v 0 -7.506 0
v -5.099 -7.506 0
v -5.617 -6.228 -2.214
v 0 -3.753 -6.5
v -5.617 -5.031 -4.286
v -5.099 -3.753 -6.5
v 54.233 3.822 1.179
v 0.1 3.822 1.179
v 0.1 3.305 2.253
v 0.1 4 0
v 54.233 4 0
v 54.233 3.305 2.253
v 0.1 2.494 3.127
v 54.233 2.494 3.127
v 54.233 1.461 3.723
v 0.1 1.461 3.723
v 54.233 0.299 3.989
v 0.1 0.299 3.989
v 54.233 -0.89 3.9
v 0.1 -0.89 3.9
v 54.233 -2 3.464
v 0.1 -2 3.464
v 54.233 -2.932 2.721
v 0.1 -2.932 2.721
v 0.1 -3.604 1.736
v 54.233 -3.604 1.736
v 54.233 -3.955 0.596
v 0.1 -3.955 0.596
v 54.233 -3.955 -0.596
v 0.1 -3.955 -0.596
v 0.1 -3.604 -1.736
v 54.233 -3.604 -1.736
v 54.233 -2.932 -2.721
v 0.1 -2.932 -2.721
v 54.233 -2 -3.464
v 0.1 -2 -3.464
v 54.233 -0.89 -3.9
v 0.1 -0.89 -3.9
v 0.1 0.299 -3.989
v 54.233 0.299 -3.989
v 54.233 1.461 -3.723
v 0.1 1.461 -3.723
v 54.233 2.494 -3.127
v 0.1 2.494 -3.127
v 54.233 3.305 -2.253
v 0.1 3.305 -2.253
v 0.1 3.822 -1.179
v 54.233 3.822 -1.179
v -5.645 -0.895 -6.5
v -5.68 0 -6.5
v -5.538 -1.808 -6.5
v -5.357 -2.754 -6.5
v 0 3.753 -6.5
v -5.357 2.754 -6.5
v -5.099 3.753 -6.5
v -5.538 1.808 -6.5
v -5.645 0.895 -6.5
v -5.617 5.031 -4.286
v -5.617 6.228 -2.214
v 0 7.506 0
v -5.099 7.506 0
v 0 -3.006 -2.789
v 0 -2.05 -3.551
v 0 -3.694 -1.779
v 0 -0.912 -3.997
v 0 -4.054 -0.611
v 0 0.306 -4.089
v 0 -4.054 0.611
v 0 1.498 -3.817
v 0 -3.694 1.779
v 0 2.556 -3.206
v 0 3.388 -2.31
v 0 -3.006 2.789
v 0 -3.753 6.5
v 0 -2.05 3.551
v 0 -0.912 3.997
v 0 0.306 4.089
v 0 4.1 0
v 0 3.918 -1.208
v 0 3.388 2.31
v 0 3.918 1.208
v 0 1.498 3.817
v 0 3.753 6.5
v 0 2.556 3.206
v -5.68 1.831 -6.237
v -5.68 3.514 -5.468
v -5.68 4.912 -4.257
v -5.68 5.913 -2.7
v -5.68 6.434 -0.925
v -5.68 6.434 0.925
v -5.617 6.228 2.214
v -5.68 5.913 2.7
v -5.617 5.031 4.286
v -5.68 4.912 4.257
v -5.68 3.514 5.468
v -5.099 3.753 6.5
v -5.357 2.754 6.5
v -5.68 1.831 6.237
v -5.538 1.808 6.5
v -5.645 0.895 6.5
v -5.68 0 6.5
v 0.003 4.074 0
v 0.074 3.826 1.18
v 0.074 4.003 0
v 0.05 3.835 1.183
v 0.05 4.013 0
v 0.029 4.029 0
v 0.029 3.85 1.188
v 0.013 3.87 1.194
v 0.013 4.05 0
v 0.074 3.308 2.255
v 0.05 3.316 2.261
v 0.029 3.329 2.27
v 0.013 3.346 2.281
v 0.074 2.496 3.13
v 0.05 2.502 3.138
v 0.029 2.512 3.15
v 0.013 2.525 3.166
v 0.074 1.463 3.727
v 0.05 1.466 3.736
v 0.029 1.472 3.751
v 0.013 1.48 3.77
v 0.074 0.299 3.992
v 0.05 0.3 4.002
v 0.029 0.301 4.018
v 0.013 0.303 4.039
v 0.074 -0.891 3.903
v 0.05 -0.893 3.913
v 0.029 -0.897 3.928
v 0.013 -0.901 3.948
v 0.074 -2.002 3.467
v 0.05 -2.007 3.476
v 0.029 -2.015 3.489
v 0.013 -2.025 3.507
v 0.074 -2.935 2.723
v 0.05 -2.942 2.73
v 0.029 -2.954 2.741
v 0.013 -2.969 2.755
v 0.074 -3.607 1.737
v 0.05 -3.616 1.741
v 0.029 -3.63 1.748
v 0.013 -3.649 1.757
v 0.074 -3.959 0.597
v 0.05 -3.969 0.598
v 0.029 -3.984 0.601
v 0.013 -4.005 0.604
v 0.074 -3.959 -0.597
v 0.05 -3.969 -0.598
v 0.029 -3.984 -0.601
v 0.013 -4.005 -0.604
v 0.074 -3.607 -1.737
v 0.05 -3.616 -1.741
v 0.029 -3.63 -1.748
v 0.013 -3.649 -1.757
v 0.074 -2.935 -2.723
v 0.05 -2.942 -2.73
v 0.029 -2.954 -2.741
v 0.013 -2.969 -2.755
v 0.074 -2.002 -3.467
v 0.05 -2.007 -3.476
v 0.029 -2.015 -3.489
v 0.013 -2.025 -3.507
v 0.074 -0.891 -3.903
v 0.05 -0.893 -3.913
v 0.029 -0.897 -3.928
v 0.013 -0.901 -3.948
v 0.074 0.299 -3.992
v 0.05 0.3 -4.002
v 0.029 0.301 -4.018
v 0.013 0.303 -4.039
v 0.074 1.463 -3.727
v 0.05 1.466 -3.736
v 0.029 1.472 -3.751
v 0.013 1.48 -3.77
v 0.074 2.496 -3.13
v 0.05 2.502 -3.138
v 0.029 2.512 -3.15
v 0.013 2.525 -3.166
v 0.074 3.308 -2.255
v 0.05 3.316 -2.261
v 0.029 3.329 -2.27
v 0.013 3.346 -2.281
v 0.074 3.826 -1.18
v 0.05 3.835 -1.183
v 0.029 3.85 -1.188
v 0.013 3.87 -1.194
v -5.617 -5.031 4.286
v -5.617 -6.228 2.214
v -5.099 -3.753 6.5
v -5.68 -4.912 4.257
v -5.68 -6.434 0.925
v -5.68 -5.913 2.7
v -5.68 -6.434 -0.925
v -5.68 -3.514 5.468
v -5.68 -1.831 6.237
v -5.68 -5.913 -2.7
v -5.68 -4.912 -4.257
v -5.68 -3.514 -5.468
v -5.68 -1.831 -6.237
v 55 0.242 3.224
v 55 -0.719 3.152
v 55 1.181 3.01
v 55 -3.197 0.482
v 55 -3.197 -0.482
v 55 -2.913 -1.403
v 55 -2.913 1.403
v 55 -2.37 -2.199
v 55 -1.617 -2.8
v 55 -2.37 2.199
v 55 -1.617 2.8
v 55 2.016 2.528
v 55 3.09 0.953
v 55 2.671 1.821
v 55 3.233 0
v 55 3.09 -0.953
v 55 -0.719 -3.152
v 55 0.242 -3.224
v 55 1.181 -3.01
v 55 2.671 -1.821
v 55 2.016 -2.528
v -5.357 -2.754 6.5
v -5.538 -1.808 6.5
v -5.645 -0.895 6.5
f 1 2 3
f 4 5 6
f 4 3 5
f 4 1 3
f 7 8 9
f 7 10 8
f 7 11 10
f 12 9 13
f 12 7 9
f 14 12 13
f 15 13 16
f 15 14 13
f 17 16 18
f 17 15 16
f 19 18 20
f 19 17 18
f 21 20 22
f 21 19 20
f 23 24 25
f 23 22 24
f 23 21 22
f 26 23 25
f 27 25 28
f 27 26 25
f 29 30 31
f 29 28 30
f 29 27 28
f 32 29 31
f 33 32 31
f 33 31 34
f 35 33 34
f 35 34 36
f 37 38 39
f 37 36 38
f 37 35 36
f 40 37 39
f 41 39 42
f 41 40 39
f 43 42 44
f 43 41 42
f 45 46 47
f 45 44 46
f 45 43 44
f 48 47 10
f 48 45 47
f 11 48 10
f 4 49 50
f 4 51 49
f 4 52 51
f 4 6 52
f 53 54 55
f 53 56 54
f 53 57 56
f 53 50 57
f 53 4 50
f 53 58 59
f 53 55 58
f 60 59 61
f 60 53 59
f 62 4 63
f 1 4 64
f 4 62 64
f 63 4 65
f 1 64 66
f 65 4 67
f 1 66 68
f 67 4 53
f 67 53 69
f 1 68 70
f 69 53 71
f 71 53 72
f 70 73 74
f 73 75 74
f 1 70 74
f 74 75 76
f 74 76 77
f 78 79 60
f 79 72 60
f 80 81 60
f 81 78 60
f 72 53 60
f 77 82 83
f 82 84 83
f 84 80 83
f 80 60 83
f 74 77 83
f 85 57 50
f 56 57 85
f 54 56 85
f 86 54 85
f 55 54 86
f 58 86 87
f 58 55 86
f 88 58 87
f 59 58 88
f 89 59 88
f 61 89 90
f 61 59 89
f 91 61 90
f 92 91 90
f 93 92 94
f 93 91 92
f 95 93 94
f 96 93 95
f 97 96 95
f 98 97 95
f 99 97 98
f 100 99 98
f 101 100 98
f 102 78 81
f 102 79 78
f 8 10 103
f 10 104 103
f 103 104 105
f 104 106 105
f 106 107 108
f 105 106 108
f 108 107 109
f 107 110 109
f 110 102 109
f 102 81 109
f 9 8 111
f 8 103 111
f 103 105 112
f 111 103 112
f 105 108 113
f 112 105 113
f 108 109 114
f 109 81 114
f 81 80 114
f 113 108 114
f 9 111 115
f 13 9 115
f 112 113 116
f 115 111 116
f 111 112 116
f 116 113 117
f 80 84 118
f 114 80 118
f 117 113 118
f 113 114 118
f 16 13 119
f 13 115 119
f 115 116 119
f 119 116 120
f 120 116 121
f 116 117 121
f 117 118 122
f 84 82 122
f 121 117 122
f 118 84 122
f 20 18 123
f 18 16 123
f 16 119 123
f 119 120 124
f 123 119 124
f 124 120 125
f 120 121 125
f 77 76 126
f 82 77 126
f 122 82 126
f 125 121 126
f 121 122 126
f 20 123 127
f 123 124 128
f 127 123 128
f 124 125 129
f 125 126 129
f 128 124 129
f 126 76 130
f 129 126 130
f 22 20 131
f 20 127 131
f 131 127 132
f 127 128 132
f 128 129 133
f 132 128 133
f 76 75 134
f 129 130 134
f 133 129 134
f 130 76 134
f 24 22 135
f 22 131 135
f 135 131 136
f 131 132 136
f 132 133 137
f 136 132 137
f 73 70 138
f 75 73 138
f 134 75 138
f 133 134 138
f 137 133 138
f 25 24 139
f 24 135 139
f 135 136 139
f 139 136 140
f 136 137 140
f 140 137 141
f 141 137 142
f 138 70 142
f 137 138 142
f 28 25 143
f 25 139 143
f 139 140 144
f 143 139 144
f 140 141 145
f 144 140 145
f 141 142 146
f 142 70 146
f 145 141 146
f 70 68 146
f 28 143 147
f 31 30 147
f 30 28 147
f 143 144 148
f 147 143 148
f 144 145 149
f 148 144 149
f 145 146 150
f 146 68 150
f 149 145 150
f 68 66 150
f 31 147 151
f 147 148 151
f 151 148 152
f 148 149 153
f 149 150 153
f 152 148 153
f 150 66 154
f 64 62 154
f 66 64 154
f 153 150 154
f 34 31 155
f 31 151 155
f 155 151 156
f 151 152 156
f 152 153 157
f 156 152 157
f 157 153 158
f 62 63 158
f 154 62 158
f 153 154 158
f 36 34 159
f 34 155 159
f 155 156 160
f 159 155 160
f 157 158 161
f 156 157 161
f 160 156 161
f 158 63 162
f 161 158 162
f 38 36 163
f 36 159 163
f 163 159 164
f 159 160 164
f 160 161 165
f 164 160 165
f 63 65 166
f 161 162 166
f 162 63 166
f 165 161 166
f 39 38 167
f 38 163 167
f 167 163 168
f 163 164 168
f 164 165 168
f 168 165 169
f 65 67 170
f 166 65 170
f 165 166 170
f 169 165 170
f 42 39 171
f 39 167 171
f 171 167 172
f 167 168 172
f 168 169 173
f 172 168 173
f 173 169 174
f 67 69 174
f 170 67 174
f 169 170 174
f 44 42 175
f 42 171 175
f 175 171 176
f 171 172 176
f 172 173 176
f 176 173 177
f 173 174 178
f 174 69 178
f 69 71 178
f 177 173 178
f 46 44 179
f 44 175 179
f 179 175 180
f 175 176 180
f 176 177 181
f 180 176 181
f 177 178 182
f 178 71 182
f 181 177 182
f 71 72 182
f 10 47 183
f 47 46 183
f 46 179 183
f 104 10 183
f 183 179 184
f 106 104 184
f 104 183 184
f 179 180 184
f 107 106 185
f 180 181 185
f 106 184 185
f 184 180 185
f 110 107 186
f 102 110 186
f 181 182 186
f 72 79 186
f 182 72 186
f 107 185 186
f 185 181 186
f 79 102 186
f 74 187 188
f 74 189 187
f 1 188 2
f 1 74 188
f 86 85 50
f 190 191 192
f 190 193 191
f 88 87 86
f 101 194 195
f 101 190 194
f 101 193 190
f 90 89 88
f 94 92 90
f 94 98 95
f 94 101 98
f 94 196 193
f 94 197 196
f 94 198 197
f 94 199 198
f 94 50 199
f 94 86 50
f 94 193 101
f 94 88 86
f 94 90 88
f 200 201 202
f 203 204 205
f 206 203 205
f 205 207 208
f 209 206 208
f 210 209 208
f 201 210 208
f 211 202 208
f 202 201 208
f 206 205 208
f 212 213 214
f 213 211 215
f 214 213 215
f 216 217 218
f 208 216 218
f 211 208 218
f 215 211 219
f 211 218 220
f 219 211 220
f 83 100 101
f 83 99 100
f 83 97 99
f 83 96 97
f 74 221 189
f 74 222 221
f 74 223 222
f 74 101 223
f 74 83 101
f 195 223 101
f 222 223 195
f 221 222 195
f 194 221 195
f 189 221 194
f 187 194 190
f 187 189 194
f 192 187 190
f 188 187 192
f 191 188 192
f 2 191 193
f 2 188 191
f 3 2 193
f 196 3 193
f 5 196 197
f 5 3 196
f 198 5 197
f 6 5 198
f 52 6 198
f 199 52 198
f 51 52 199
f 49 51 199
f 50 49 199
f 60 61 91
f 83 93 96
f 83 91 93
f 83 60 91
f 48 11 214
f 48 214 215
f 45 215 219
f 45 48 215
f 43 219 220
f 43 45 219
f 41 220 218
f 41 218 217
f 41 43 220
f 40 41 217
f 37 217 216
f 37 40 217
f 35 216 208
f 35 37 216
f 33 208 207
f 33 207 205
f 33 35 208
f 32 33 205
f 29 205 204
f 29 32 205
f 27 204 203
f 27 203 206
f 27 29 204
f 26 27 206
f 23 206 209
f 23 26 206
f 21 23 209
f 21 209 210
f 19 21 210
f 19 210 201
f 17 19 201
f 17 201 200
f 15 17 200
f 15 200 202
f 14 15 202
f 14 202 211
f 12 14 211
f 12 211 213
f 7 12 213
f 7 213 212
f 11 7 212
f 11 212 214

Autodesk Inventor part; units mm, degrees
ref_plane "YZ Plane" through (0, 0, 0) normal (1, 0, 0) x (0, 1, 0)
ref_plane "XZ Plane" through (0, 0, 0) normal (0, 1, 0) x (-1, 0, 0)
sketch "Sketch1" plane through (0, 0, 0) normal (0, 0, 1) x (1, 0, 0)
  line L0 (0, 4) -> (55, 4)
  line L1 (55, 4) -> (55, 0)
  line L2 (55, 0) -> (0, 0)
  line L3 (-11, 0) -> (66, 0) projected
  line L4 (0, -0.8) -> (0, 4.8) projected
  line L5 (0, 4) -> (0, 0)
  dimension "d2" = 8
  dimension "d59" = 55
revolve "Body" add sketch "Sketch1" angle 360 about axis through (55, 0, 0) along (-1, 0, 0)
sketch "Sketch2" plane through (0, 0, 0) normal (-1, 0, 0) x (0, 0, 1)
  line L0 (0, 7.5056) -> (6.5, 3.7528)
  line L1 (6.5, 3.7528) -> (6.5, -3.7528)
  line L2 (6.5, -3.7528) -> (0, -7.5056)
  line L3 (0, -7.5056) -> (-6.5, -3.7528)
  line L4 (-6.5, -3.7528) -> (-6.5, 3.7528)
  line L5 (-6.5, 3.7528) -> (0, 7.5056)
  line L6 (-9.1, 0) -> (9.1, 0) projected
  line L7 (0, 10.5078) -> (0, -10.5078) projected
  point P0 (0, 0)
  point P1 (0, 0)
  dimension "d11" = 13
extrude "Head" add sketch "Sketch2" along normal blind 5.68
sketch "Sketch4" plane through (0, 0, 0) normal (0, 0, 1) x (1, 0, 0)
  line L0 (-4.9294, 7.8) -> (-5.68, 6.5)
  line L1 (-1.1, 0) -> (-0.234, 0)
  line L2 (-6.7692, 0) -> (0.8552, 0) projected
  line L3 (-5.68, 7.8) -> (-4.9294, 7.8)
  line L4 (-5.68, 6.5) -> (-5.68, 7.8)
  line L5 (0, 9.36) -> (0, -1.56) projected
  dimension "d65" = 13
  dimension "d67" = 30
  dimension "d68" = 15.6
  dimension "d69" = 5.68
revolve "Chamfer1" cut sketch "Sketch4" angle 360 about axis through (-1.1, 0, 0) along (1, 0, 0)
thread "Thread" size "M8x1.25" class "6g" standard "ISO Metric profile" length 22
chamfer "Chamfer2" distance 0.7668 distance2 0.7669 1 edges at (55, -4, 0) measured on face at (55, -1.1806, 1.575)
fillet "Fillet" radius 0.1 1 edges at (0, -4, 0)
ref_plane "Work Plane1" through (1.525, 0, 0) normal (0, 0, 1) x (1, 0, 0)
equation "\"d2\" = GD"
equation "\"d59\" = NLG"
equation "\"d11\" = SW"
equation "\"d3\" = KOH"
equation "\"d15\" = GEL"
equation "\"d6\" = -0.5 * SPD + 0.5 * GD"
equation "\"d71\" = RR"
equation "\"d65\" = SW"
equation "\"d67\" = ANG1"
equation "\"d68\" = 1.2 * SW"
equation "\"d69\" = KOH"
equation "\"NLG\" = 55"
equation "\"GD\" = NND"
equation "\"BDM\" = NND"
equation "\"KOH\" = 5.68"
equation "\"GEL\" = 22"
equation "\"SW\" = 13"
equation "\"SW0\" = SW"
equation "\"SPD\" = NND - 1.2269 * PTC"
equation "\"SD2\" = NND"
equation "\"SD\" = 0"
equation "\"ANG1\" = 30deg"
equation "\"GAL\" = 0.61345 * PTC"
equation "\"GUL\" = 0.61345 * PTC"
equation "\"RR\" = 0.1"
equation "\"RR1\" = 0.4"
equation "\"GD1\" = THREADDIA - 1.2269 * PTC"
equation "\"THREADDIA\" = 8"
equation "\"TOA\" = 30deg"
equation "\"PTC\" = 1.25"
equation "\"KOH1\" = 3.7"
equation "\"NND\" = 8"
equation "\"E0\" = 1.155 * SW"
properties part number "ANSI B18.2.3.5M - M8 x 1.25 x 55" material "Steel, Mild"
